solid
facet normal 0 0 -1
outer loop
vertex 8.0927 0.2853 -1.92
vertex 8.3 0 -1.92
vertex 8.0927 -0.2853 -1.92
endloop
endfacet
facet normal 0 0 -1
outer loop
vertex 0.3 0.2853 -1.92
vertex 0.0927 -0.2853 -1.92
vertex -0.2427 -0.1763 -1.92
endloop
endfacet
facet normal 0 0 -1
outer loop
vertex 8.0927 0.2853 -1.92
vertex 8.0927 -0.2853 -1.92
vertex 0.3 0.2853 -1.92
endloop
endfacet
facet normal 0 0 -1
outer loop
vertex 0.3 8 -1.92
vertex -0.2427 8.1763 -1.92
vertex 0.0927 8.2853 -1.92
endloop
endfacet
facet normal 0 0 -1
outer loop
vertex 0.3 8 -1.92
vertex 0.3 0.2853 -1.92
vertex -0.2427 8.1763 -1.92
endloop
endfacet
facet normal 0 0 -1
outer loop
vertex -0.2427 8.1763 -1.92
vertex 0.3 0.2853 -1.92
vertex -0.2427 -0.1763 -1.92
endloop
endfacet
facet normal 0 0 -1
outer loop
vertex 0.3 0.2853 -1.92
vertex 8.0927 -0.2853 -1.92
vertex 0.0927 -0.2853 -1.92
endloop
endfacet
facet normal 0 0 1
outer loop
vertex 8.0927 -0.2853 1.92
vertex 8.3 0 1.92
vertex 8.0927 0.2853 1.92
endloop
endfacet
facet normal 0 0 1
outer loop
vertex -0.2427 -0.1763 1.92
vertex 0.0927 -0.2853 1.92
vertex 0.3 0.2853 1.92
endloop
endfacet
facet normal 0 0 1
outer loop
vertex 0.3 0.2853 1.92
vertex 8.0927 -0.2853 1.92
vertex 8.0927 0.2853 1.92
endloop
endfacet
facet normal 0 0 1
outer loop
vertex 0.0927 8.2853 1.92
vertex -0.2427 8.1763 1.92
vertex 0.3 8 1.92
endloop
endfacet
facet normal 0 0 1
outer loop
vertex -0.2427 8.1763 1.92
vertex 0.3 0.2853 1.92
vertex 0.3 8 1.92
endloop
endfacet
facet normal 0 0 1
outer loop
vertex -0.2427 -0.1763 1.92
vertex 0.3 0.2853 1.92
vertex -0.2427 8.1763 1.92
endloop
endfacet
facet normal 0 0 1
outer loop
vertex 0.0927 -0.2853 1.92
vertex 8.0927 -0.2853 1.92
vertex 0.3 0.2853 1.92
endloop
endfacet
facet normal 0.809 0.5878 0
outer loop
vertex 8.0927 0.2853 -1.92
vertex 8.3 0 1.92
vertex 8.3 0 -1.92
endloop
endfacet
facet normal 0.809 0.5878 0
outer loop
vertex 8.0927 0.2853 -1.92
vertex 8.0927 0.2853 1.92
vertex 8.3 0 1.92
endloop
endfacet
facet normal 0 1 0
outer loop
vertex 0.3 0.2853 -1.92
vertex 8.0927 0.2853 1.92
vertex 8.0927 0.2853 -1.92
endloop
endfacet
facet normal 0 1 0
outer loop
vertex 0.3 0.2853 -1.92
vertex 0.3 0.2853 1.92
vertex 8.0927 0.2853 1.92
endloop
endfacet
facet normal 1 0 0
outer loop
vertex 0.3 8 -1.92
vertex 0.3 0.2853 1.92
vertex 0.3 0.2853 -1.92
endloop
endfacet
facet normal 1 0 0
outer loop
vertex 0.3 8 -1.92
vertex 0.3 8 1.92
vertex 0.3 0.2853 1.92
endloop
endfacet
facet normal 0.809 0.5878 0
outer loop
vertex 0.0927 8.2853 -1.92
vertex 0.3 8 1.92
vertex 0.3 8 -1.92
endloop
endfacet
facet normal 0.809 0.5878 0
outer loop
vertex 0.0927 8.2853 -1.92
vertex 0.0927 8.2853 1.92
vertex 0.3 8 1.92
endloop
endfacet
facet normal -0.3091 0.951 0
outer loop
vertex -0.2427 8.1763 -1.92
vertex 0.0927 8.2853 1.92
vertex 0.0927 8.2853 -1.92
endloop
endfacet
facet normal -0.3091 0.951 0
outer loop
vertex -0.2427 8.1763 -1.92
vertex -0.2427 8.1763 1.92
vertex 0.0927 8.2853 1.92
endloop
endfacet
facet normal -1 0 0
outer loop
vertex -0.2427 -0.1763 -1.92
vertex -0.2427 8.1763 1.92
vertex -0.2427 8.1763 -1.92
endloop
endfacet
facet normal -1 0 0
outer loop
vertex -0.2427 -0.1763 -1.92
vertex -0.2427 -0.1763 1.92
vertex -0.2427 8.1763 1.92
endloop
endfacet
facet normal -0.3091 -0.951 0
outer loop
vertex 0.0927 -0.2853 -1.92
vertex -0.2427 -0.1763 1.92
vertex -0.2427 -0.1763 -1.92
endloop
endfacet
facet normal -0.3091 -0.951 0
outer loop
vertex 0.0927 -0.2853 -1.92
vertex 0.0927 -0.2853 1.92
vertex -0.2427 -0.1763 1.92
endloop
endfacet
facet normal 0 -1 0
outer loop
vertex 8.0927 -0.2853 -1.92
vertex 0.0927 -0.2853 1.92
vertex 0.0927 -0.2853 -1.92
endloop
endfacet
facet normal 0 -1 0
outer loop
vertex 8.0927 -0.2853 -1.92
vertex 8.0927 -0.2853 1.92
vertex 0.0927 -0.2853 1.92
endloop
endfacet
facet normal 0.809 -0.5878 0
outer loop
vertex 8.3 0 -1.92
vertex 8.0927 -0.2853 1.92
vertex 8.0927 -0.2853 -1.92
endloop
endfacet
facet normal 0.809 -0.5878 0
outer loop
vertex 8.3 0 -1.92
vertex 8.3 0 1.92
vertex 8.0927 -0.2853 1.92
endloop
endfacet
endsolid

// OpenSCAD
$fa = 1; // minimum angle
$fs = 0.4; // minimum size
z_layer = 0.24; // layer thickness

x_pts = 8;
y_pts = 8;
thick = 0.6;

pts = [
    [x_pts,0],
    [0,0],
    [0,y_pts],
];

linear_extrude(z_layer*16, center = true)
for (p = [0:2]) {
    hull() {
        translate(pts[p]) circle(d = thick, center = true);
        translate(pts[p+1]) circle(d = thick, center = true);
    }
}
